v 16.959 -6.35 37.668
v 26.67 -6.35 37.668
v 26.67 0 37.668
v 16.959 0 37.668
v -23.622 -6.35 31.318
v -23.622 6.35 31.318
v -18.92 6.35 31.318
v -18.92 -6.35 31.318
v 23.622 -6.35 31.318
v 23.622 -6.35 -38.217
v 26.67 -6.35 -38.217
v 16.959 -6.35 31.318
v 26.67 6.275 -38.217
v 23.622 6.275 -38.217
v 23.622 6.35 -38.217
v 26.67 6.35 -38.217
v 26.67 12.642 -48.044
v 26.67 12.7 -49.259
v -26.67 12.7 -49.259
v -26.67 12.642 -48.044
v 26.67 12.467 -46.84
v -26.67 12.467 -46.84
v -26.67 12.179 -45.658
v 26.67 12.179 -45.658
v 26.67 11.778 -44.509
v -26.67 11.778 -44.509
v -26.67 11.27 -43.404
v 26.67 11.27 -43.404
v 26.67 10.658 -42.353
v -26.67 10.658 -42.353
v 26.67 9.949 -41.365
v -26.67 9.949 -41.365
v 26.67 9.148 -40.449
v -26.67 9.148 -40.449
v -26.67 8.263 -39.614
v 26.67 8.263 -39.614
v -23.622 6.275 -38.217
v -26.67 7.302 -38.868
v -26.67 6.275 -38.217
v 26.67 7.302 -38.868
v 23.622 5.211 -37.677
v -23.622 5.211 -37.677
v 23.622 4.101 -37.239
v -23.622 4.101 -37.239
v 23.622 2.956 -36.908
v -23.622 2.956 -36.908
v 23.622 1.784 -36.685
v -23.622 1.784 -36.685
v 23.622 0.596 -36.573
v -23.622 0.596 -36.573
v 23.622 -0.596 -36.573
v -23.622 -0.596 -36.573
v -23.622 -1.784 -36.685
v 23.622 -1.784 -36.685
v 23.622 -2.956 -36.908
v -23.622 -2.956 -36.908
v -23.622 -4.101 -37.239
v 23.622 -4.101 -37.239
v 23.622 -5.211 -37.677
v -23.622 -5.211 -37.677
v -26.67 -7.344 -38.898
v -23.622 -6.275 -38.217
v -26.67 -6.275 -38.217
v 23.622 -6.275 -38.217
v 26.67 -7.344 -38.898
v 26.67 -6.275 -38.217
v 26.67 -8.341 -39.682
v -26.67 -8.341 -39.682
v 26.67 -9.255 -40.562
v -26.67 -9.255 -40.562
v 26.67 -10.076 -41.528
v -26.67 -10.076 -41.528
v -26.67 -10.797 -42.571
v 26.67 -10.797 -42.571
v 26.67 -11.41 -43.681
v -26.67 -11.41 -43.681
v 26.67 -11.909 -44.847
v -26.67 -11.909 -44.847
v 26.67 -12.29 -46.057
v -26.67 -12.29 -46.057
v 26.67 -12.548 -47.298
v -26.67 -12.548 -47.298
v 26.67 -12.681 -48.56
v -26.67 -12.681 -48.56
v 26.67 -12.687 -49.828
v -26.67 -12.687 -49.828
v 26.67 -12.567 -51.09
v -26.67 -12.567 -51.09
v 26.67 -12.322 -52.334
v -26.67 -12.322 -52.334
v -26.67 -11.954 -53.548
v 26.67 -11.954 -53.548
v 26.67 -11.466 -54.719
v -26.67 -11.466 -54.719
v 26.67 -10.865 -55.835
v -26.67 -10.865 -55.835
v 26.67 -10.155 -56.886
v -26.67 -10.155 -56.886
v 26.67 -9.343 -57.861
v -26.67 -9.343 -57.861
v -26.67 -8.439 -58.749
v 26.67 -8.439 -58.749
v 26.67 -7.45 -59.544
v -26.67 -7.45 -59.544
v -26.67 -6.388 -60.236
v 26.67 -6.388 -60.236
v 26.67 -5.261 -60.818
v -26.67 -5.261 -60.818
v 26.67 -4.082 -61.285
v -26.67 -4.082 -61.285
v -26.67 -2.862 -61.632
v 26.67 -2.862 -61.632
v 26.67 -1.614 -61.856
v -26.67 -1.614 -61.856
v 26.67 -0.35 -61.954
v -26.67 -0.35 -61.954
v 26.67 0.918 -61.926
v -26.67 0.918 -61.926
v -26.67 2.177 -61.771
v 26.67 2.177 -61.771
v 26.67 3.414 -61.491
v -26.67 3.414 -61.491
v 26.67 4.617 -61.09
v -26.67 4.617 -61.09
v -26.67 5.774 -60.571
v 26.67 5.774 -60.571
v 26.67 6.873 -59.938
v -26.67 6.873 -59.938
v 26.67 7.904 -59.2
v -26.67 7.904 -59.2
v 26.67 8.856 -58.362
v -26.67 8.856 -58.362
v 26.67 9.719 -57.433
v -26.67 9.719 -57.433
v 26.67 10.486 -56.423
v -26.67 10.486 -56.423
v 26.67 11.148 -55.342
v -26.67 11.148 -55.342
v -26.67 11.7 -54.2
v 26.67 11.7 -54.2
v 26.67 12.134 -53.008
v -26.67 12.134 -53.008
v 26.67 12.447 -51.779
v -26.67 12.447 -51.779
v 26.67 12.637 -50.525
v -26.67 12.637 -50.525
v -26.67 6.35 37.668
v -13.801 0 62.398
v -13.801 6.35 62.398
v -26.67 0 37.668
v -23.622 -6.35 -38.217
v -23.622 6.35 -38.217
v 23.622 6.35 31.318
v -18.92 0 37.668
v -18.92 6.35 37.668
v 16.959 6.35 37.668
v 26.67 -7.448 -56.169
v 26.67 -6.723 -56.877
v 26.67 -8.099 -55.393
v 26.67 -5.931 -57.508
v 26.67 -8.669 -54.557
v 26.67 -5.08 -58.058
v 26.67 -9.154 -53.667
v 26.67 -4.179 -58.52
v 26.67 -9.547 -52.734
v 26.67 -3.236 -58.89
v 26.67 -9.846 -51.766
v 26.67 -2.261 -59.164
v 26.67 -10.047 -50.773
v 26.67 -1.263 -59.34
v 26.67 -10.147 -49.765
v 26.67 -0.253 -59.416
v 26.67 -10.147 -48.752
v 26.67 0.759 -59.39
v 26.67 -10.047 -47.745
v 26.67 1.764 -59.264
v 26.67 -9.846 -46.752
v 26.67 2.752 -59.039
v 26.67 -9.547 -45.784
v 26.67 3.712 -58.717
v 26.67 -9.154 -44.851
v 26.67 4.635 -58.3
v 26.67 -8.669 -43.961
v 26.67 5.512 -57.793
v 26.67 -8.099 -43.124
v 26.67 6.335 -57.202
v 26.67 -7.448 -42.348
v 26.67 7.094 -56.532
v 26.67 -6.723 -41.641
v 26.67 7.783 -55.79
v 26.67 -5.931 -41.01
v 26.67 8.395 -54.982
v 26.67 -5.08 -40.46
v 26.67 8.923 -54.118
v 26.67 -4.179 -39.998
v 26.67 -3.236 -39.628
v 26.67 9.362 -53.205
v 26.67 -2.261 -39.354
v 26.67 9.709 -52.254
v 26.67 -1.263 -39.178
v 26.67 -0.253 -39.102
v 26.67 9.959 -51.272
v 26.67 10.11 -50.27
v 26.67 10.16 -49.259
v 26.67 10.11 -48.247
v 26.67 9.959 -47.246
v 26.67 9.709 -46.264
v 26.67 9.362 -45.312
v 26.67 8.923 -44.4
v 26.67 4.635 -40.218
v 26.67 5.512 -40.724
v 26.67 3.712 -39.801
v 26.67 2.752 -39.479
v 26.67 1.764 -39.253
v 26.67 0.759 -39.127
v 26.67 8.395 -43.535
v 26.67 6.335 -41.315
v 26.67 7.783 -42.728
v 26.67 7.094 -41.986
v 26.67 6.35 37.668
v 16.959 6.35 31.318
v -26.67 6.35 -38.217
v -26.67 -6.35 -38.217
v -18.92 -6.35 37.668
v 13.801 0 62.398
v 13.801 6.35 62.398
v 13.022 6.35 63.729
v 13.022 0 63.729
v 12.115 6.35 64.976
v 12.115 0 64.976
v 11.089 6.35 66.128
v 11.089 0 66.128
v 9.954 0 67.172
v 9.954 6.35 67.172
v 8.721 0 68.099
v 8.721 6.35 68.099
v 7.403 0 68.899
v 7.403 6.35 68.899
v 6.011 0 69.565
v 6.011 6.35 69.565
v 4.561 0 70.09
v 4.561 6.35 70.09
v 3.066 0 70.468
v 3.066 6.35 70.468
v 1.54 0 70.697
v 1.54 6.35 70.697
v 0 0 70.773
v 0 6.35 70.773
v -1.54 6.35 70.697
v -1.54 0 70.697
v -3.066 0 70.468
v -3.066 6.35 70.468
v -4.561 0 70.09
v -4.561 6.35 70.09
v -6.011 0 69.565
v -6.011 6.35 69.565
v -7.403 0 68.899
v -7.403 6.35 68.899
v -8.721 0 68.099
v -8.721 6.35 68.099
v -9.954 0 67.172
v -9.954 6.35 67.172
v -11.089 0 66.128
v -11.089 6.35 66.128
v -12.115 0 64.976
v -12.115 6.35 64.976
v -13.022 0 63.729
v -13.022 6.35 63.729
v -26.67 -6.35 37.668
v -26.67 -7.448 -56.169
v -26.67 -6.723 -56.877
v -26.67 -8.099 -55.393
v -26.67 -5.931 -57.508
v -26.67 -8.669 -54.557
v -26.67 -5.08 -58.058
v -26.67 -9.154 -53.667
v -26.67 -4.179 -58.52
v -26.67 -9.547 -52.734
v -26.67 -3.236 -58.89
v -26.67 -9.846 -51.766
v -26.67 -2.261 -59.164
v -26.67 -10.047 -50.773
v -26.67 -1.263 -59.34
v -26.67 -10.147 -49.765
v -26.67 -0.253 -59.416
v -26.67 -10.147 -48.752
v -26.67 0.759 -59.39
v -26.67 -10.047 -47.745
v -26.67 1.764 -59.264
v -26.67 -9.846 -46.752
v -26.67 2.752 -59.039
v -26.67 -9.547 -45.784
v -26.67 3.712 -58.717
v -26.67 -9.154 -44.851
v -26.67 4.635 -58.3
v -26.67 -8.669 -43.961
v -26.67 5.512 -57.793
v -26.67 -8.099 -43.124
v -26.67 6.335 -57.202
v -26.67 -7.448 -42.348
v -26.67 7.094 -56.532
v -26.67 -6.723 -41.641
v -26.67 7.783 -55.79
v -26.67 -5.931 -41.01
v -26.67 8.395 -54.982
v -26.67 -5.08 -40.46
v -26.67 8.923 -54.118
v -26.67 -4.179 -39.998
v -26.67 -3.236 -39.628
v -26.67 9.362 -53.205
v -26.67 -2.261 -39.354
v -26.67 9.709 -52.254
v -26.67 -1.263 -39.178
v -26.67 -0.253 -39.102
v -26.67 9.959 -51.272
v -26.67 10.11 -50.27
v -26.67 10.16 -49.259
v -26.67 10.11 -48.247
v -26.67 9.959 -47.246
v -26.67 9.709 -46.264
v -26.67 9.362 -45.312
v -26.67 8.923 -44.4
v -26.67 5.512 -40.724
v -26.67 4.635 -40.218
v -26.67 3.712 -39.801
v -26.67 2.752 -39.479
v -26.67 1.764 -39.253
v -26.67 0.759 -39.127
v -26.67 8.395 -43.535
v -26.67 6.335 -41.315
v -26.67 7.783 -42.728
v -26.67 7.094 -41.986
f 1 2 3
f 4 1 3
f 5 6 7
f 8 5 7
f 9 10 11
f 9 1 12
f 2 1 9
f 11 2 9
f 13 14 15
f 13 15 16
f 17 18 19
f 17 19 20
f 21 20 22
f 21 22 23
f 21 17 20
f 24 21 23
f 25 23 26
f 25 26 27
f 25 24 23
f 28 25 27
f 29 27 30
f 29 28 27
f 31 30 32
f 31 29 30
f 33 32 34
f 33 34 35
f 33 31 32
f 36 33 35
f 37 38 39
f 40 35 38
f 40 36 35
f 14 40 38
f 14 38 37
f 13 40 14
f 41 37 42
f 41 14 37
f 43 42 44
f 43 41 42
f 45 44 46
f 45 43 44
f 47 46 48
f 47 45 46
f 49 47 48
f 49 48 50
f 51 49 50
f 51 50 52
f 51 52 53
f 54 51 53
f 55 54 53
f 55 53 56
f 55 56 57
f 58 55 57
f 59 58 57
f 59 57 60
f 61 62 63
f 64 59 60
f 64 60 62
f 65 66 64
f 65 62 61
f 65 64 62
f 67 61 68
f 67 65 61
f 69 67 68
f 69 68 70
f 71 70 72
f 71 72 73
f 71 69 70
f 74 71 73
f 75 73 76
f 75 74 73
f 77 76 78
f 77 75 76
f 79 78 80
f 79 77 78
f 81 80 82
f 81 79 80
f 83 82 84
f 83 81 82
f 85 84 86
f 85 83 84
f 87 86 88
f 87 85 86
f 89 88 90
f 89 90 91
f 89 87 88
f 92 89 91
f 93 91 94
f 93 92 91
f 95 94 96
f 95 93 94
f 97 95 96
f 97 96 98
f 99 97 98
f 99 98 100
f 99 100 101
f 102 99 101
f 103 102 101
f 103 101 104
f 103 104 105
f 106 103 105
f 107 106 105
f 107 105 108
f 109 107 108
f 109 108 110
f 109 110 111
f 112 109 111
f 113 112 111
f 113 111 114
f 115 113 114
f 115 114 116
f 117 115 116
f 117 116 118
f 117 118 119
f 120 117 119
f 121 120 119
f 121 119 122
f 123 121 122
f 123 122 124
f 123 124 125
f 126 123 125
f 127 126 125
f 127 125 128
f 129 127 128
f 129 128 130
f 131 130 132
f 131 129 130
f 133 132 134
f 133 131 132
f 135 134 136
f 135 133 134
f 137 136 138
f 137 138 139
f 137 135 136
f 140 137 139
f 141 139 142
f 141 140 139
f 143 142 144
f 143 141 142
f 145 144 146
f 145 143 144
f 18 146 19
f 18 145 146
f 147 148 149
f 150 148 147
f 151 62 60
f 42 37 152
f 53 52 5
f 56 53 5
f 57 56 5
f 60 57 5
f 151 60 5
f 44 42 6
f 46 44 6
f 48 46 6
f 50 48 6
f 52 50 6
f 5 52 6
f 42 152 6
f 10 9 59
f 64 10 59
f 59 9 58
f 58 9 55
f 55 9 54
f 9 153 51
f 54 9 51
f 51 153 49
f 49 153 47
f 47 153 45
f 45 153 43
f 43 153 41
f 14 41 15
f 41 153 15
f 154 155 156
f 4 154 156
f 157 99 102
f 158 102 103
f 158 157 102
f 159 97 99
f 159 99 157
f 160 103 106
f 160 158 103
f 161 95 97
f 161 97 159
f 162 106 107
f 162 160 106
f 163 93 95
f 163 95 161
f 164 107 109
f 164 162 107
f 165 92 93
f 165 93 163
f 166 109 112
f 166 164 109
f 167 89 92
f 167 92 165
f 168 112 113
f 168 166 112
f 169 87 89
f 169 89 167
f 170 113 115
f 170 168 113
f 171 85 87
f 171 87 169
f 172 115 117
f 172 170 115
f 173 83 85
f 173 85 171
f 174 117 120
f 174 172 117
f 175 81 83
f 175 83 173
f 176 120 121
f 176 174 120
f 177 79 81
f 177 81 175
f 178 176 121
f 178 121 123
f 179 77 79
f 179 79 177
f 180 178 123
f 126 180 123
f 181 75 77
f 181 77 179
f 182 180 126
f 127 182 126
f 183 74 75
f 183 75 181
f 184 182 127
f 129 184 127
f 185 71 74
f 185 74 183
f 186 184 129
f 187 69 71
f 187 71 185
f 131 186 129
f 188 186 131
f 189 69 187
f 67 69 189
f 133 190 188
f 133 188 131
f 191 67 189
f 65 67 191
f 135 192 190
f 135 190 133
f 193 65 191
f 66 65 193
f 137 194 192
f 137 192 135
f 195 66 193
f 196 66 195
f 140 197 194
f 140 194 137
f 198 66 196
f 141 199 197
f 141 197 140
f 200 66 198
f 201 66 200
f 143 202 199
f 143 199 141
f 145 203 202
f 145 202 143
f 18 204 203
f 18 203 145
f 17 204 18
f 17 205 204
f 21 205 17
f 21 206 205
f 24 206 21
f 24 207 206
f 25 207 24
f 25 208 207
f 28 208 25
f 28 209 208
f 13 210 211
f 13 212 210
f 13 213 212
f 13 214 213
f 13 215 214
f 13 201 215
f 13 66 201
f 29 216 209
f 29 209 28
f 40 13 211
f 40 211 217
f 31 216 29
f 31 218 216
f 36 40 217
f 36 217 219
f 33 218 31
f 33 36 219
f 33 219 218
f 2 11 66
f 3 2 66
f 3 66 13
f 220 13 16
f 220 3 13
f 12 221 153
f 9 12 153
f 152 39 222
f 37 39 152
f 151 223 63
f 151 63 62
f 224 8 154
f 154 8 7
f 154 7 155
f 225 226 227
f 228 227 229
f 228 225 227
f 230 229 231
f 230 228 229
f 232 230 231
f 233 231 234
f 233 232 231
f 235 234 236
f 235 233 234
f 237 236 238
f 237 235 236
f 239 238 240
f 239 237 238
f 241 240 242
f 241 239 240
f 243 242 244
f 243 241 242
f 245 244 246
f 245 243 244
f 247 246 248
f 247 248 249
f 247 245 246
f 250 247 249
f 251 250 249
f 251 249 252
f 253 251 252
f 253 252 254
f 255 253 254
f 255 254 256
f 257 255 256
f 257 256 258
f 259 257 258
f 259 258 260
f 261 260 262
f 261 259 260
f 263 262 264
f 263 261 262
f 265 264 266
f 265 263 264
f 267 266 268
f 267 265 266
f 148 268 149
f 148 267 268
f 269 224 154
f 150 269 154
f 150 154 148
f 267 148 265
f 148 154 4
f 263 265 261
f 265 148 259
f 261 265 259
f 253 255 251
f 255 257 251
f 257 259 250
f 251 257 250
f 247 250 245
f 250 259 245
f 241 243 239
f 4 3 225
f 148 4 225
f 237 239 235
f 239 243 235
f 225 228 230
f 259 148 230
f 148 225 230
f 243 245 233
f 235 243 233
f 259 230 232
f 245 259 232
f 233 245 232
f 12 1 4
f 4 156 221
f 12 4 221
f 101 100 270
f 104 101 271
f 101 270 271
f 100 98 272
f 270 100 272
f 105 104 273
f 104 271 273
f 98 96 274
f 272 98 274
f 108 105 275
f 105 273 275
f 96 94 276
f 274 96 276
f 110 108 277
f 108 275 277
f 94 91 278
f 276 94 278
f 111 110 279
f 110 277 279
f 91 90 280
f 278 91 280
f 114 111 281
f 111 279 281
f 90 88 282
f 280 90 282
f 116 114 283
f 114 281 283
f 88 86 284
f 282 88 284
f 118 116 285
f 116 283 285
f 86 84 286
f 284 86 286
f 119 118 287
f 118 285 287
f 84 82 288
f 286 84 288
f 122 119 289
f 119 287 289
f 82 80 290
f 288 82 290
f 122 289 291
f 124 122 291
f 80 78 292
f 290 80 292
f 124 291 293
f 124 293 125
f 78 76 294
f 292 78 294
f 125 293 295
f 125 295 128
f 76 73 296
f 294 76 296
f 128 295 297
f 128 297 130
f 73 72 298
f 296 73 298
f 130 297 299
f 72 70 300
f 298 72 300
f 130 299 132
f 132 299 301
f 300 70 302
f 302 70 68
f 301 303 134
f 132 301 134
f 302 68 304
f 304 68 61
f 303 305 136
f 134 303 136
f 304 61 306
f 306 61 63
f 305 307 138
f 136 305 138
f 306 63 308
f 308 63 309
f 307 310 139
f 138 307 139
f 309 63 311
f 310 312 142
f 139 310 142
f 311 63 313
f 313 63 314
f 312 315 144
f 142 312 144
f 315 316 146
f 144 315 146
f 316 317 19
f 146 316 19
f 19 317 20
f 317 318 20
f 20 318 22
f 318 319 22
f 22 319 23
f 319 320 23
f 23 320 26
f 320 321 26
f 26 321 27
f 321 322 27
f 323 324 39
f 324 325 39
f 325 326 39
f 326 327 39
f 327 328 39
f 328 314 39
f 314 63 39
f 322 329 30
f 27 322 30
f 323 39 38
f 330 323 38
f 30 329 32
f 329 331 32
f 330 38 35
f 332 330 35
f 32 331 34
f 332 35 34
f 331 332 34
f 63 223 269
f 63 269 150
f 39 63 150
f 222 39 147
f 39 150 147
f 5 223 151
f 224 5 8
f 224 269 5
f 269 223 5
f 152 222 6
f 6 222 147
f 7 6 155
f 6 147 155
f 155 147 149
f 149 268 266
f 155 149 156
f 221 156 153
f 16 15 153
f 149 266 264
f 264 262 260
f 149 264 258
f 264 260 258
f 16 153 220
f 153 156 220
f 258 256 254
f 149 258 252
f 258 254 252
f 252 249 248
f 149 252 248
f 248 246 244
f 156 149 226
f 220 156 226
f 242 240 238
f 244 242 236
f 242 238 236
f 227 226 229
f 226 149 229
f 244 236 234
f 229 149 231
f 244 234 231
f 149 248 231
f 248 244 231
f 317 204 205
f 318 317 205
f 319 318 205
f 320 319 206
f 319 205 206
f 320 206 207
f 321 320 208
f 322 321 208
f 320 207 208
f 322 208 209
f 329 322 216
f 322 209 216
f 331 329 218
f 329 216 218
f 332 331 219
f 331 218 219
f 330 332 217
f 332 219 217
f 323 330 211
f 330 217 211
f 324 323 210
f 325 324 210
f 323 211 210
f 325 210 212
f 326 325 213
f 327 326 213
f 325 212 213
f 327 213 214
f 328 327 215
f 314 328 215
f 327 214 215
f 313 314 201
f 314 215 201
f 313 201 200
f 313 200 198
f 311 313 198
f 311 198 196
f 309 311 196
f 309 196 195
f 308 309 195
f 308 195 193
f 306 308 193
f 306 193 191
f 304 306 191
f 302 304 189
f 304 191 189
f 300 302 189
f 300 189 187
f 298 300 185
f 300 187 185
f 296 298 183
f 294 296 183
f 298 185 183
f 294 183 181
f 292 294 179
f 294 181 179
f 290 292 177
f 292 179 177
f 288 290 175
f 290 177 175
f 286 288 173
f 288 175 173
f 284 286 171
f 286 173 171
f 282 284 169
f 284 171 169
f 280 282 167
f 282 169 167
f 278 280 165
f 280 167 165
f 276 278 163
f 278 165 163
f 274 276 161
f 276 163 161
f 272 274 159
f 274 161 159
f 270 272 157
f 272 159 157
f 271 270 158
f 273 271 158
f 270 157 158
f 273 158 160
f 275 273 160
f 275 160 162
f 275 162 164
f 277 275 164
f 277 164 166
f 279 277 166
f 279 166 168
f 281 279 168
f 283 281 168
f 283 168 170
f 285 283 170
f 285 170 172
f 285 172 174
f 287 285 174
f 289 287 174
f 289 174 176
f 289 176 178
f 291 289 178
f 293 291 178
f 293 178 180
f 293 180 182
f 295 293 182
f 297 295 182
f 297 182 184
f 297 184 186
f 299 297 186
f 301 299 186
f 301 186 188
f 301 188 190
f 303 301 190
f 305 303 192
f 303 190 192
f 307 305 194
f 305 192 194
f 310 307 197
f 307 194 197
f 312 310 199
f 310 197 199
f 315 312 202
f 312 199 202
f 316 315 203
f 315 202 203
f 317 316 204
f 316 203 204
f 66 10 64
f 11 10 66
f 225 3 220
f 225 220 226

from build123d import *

# Parameters (mm, degrees)
F0_W     = 53.34
F0_H     = 69.102946
F1_DEPTH = 6.35
F3_DEPTH = 25.4
F4_W     = 6.35
F4_H     = 38.1
F5_DEPTH = 63.5
F6_R     = 12.7
F7_DEPTH = 53.34
F8_R     = 10.16
F9_DEPTH = 53.34


with BuildPart() as f1:
    # F0 (on Front) → F1 (new body, symmetric)
    with BuildSketch(Plane.XZ):
        with BuildLine():
            Line((26.67, 37.667938), (13.800602, 62.397646))
            ThreePointArc((13.800602, 62.397646), (0, 70.77328), (-13.800602, 62.397646))
            Line((-13.800602, 62.397646), (-26.67, 37.667938))
            Line((-26.67, 37.667938), (-26.67, 30.885875))
            Line((-26.67, 30.885875), (26.67, 30.885875))
            Line((26.67, 30.885875), (26.67, 37.667938))
        make_face()
        with Locations((0, -3.665598)):
            Rectangle(F0_W, F0_H)
    extrude(amount=F1_DEPTH, both=True)

    # F2 (on face) → F3 (cut)
    with BuildSketch(Plane(origin=(0, 6.35, 0), x_dir=(-1, 0, 0), z_dir=(0, 1, 0))):
        Polygon((-23.622, 31.317938), (-23.622, -38.217071), (23.622, -38.217071), (23.622, 31.317938), (18.919615, 31.317938), (18.919615, 37.667938), (-16.959142, 37.667938), (-16.959142, 31.317938), align=None)
    extrude(amount=-F3_DEPTH, mode=Mode.SUBTRACT)

    # F4 (on face) → F5 (cut)
    with BuildSketch(Plane.YZ.offset(26.67)):
        with Locations((-3.175, 56.717938)):
            Rectangle(F4_W, F4_H)
    extrude(amount=-F5_DEPTH, mode=Mode.SUBTRACT)

    # F6 (on face) → F7 (join)
    with BuildSketch(Plane.YZ.offset(26.67)):
        with Locations((0, -49.258824)):
            Circle(F6_R)
    extrude(amount=-F7_DEPTH)

    # F8 (on face) → F9 (cut)
    with BuildSketch(Plane.YZ.offset(26.67)):
        with Locations((0, -49.258824)):
            Circle(F8_R)
    extrude(amount=-F9_DEPTH, mode=Mode.SUBTRACT)


solid = f1.part
